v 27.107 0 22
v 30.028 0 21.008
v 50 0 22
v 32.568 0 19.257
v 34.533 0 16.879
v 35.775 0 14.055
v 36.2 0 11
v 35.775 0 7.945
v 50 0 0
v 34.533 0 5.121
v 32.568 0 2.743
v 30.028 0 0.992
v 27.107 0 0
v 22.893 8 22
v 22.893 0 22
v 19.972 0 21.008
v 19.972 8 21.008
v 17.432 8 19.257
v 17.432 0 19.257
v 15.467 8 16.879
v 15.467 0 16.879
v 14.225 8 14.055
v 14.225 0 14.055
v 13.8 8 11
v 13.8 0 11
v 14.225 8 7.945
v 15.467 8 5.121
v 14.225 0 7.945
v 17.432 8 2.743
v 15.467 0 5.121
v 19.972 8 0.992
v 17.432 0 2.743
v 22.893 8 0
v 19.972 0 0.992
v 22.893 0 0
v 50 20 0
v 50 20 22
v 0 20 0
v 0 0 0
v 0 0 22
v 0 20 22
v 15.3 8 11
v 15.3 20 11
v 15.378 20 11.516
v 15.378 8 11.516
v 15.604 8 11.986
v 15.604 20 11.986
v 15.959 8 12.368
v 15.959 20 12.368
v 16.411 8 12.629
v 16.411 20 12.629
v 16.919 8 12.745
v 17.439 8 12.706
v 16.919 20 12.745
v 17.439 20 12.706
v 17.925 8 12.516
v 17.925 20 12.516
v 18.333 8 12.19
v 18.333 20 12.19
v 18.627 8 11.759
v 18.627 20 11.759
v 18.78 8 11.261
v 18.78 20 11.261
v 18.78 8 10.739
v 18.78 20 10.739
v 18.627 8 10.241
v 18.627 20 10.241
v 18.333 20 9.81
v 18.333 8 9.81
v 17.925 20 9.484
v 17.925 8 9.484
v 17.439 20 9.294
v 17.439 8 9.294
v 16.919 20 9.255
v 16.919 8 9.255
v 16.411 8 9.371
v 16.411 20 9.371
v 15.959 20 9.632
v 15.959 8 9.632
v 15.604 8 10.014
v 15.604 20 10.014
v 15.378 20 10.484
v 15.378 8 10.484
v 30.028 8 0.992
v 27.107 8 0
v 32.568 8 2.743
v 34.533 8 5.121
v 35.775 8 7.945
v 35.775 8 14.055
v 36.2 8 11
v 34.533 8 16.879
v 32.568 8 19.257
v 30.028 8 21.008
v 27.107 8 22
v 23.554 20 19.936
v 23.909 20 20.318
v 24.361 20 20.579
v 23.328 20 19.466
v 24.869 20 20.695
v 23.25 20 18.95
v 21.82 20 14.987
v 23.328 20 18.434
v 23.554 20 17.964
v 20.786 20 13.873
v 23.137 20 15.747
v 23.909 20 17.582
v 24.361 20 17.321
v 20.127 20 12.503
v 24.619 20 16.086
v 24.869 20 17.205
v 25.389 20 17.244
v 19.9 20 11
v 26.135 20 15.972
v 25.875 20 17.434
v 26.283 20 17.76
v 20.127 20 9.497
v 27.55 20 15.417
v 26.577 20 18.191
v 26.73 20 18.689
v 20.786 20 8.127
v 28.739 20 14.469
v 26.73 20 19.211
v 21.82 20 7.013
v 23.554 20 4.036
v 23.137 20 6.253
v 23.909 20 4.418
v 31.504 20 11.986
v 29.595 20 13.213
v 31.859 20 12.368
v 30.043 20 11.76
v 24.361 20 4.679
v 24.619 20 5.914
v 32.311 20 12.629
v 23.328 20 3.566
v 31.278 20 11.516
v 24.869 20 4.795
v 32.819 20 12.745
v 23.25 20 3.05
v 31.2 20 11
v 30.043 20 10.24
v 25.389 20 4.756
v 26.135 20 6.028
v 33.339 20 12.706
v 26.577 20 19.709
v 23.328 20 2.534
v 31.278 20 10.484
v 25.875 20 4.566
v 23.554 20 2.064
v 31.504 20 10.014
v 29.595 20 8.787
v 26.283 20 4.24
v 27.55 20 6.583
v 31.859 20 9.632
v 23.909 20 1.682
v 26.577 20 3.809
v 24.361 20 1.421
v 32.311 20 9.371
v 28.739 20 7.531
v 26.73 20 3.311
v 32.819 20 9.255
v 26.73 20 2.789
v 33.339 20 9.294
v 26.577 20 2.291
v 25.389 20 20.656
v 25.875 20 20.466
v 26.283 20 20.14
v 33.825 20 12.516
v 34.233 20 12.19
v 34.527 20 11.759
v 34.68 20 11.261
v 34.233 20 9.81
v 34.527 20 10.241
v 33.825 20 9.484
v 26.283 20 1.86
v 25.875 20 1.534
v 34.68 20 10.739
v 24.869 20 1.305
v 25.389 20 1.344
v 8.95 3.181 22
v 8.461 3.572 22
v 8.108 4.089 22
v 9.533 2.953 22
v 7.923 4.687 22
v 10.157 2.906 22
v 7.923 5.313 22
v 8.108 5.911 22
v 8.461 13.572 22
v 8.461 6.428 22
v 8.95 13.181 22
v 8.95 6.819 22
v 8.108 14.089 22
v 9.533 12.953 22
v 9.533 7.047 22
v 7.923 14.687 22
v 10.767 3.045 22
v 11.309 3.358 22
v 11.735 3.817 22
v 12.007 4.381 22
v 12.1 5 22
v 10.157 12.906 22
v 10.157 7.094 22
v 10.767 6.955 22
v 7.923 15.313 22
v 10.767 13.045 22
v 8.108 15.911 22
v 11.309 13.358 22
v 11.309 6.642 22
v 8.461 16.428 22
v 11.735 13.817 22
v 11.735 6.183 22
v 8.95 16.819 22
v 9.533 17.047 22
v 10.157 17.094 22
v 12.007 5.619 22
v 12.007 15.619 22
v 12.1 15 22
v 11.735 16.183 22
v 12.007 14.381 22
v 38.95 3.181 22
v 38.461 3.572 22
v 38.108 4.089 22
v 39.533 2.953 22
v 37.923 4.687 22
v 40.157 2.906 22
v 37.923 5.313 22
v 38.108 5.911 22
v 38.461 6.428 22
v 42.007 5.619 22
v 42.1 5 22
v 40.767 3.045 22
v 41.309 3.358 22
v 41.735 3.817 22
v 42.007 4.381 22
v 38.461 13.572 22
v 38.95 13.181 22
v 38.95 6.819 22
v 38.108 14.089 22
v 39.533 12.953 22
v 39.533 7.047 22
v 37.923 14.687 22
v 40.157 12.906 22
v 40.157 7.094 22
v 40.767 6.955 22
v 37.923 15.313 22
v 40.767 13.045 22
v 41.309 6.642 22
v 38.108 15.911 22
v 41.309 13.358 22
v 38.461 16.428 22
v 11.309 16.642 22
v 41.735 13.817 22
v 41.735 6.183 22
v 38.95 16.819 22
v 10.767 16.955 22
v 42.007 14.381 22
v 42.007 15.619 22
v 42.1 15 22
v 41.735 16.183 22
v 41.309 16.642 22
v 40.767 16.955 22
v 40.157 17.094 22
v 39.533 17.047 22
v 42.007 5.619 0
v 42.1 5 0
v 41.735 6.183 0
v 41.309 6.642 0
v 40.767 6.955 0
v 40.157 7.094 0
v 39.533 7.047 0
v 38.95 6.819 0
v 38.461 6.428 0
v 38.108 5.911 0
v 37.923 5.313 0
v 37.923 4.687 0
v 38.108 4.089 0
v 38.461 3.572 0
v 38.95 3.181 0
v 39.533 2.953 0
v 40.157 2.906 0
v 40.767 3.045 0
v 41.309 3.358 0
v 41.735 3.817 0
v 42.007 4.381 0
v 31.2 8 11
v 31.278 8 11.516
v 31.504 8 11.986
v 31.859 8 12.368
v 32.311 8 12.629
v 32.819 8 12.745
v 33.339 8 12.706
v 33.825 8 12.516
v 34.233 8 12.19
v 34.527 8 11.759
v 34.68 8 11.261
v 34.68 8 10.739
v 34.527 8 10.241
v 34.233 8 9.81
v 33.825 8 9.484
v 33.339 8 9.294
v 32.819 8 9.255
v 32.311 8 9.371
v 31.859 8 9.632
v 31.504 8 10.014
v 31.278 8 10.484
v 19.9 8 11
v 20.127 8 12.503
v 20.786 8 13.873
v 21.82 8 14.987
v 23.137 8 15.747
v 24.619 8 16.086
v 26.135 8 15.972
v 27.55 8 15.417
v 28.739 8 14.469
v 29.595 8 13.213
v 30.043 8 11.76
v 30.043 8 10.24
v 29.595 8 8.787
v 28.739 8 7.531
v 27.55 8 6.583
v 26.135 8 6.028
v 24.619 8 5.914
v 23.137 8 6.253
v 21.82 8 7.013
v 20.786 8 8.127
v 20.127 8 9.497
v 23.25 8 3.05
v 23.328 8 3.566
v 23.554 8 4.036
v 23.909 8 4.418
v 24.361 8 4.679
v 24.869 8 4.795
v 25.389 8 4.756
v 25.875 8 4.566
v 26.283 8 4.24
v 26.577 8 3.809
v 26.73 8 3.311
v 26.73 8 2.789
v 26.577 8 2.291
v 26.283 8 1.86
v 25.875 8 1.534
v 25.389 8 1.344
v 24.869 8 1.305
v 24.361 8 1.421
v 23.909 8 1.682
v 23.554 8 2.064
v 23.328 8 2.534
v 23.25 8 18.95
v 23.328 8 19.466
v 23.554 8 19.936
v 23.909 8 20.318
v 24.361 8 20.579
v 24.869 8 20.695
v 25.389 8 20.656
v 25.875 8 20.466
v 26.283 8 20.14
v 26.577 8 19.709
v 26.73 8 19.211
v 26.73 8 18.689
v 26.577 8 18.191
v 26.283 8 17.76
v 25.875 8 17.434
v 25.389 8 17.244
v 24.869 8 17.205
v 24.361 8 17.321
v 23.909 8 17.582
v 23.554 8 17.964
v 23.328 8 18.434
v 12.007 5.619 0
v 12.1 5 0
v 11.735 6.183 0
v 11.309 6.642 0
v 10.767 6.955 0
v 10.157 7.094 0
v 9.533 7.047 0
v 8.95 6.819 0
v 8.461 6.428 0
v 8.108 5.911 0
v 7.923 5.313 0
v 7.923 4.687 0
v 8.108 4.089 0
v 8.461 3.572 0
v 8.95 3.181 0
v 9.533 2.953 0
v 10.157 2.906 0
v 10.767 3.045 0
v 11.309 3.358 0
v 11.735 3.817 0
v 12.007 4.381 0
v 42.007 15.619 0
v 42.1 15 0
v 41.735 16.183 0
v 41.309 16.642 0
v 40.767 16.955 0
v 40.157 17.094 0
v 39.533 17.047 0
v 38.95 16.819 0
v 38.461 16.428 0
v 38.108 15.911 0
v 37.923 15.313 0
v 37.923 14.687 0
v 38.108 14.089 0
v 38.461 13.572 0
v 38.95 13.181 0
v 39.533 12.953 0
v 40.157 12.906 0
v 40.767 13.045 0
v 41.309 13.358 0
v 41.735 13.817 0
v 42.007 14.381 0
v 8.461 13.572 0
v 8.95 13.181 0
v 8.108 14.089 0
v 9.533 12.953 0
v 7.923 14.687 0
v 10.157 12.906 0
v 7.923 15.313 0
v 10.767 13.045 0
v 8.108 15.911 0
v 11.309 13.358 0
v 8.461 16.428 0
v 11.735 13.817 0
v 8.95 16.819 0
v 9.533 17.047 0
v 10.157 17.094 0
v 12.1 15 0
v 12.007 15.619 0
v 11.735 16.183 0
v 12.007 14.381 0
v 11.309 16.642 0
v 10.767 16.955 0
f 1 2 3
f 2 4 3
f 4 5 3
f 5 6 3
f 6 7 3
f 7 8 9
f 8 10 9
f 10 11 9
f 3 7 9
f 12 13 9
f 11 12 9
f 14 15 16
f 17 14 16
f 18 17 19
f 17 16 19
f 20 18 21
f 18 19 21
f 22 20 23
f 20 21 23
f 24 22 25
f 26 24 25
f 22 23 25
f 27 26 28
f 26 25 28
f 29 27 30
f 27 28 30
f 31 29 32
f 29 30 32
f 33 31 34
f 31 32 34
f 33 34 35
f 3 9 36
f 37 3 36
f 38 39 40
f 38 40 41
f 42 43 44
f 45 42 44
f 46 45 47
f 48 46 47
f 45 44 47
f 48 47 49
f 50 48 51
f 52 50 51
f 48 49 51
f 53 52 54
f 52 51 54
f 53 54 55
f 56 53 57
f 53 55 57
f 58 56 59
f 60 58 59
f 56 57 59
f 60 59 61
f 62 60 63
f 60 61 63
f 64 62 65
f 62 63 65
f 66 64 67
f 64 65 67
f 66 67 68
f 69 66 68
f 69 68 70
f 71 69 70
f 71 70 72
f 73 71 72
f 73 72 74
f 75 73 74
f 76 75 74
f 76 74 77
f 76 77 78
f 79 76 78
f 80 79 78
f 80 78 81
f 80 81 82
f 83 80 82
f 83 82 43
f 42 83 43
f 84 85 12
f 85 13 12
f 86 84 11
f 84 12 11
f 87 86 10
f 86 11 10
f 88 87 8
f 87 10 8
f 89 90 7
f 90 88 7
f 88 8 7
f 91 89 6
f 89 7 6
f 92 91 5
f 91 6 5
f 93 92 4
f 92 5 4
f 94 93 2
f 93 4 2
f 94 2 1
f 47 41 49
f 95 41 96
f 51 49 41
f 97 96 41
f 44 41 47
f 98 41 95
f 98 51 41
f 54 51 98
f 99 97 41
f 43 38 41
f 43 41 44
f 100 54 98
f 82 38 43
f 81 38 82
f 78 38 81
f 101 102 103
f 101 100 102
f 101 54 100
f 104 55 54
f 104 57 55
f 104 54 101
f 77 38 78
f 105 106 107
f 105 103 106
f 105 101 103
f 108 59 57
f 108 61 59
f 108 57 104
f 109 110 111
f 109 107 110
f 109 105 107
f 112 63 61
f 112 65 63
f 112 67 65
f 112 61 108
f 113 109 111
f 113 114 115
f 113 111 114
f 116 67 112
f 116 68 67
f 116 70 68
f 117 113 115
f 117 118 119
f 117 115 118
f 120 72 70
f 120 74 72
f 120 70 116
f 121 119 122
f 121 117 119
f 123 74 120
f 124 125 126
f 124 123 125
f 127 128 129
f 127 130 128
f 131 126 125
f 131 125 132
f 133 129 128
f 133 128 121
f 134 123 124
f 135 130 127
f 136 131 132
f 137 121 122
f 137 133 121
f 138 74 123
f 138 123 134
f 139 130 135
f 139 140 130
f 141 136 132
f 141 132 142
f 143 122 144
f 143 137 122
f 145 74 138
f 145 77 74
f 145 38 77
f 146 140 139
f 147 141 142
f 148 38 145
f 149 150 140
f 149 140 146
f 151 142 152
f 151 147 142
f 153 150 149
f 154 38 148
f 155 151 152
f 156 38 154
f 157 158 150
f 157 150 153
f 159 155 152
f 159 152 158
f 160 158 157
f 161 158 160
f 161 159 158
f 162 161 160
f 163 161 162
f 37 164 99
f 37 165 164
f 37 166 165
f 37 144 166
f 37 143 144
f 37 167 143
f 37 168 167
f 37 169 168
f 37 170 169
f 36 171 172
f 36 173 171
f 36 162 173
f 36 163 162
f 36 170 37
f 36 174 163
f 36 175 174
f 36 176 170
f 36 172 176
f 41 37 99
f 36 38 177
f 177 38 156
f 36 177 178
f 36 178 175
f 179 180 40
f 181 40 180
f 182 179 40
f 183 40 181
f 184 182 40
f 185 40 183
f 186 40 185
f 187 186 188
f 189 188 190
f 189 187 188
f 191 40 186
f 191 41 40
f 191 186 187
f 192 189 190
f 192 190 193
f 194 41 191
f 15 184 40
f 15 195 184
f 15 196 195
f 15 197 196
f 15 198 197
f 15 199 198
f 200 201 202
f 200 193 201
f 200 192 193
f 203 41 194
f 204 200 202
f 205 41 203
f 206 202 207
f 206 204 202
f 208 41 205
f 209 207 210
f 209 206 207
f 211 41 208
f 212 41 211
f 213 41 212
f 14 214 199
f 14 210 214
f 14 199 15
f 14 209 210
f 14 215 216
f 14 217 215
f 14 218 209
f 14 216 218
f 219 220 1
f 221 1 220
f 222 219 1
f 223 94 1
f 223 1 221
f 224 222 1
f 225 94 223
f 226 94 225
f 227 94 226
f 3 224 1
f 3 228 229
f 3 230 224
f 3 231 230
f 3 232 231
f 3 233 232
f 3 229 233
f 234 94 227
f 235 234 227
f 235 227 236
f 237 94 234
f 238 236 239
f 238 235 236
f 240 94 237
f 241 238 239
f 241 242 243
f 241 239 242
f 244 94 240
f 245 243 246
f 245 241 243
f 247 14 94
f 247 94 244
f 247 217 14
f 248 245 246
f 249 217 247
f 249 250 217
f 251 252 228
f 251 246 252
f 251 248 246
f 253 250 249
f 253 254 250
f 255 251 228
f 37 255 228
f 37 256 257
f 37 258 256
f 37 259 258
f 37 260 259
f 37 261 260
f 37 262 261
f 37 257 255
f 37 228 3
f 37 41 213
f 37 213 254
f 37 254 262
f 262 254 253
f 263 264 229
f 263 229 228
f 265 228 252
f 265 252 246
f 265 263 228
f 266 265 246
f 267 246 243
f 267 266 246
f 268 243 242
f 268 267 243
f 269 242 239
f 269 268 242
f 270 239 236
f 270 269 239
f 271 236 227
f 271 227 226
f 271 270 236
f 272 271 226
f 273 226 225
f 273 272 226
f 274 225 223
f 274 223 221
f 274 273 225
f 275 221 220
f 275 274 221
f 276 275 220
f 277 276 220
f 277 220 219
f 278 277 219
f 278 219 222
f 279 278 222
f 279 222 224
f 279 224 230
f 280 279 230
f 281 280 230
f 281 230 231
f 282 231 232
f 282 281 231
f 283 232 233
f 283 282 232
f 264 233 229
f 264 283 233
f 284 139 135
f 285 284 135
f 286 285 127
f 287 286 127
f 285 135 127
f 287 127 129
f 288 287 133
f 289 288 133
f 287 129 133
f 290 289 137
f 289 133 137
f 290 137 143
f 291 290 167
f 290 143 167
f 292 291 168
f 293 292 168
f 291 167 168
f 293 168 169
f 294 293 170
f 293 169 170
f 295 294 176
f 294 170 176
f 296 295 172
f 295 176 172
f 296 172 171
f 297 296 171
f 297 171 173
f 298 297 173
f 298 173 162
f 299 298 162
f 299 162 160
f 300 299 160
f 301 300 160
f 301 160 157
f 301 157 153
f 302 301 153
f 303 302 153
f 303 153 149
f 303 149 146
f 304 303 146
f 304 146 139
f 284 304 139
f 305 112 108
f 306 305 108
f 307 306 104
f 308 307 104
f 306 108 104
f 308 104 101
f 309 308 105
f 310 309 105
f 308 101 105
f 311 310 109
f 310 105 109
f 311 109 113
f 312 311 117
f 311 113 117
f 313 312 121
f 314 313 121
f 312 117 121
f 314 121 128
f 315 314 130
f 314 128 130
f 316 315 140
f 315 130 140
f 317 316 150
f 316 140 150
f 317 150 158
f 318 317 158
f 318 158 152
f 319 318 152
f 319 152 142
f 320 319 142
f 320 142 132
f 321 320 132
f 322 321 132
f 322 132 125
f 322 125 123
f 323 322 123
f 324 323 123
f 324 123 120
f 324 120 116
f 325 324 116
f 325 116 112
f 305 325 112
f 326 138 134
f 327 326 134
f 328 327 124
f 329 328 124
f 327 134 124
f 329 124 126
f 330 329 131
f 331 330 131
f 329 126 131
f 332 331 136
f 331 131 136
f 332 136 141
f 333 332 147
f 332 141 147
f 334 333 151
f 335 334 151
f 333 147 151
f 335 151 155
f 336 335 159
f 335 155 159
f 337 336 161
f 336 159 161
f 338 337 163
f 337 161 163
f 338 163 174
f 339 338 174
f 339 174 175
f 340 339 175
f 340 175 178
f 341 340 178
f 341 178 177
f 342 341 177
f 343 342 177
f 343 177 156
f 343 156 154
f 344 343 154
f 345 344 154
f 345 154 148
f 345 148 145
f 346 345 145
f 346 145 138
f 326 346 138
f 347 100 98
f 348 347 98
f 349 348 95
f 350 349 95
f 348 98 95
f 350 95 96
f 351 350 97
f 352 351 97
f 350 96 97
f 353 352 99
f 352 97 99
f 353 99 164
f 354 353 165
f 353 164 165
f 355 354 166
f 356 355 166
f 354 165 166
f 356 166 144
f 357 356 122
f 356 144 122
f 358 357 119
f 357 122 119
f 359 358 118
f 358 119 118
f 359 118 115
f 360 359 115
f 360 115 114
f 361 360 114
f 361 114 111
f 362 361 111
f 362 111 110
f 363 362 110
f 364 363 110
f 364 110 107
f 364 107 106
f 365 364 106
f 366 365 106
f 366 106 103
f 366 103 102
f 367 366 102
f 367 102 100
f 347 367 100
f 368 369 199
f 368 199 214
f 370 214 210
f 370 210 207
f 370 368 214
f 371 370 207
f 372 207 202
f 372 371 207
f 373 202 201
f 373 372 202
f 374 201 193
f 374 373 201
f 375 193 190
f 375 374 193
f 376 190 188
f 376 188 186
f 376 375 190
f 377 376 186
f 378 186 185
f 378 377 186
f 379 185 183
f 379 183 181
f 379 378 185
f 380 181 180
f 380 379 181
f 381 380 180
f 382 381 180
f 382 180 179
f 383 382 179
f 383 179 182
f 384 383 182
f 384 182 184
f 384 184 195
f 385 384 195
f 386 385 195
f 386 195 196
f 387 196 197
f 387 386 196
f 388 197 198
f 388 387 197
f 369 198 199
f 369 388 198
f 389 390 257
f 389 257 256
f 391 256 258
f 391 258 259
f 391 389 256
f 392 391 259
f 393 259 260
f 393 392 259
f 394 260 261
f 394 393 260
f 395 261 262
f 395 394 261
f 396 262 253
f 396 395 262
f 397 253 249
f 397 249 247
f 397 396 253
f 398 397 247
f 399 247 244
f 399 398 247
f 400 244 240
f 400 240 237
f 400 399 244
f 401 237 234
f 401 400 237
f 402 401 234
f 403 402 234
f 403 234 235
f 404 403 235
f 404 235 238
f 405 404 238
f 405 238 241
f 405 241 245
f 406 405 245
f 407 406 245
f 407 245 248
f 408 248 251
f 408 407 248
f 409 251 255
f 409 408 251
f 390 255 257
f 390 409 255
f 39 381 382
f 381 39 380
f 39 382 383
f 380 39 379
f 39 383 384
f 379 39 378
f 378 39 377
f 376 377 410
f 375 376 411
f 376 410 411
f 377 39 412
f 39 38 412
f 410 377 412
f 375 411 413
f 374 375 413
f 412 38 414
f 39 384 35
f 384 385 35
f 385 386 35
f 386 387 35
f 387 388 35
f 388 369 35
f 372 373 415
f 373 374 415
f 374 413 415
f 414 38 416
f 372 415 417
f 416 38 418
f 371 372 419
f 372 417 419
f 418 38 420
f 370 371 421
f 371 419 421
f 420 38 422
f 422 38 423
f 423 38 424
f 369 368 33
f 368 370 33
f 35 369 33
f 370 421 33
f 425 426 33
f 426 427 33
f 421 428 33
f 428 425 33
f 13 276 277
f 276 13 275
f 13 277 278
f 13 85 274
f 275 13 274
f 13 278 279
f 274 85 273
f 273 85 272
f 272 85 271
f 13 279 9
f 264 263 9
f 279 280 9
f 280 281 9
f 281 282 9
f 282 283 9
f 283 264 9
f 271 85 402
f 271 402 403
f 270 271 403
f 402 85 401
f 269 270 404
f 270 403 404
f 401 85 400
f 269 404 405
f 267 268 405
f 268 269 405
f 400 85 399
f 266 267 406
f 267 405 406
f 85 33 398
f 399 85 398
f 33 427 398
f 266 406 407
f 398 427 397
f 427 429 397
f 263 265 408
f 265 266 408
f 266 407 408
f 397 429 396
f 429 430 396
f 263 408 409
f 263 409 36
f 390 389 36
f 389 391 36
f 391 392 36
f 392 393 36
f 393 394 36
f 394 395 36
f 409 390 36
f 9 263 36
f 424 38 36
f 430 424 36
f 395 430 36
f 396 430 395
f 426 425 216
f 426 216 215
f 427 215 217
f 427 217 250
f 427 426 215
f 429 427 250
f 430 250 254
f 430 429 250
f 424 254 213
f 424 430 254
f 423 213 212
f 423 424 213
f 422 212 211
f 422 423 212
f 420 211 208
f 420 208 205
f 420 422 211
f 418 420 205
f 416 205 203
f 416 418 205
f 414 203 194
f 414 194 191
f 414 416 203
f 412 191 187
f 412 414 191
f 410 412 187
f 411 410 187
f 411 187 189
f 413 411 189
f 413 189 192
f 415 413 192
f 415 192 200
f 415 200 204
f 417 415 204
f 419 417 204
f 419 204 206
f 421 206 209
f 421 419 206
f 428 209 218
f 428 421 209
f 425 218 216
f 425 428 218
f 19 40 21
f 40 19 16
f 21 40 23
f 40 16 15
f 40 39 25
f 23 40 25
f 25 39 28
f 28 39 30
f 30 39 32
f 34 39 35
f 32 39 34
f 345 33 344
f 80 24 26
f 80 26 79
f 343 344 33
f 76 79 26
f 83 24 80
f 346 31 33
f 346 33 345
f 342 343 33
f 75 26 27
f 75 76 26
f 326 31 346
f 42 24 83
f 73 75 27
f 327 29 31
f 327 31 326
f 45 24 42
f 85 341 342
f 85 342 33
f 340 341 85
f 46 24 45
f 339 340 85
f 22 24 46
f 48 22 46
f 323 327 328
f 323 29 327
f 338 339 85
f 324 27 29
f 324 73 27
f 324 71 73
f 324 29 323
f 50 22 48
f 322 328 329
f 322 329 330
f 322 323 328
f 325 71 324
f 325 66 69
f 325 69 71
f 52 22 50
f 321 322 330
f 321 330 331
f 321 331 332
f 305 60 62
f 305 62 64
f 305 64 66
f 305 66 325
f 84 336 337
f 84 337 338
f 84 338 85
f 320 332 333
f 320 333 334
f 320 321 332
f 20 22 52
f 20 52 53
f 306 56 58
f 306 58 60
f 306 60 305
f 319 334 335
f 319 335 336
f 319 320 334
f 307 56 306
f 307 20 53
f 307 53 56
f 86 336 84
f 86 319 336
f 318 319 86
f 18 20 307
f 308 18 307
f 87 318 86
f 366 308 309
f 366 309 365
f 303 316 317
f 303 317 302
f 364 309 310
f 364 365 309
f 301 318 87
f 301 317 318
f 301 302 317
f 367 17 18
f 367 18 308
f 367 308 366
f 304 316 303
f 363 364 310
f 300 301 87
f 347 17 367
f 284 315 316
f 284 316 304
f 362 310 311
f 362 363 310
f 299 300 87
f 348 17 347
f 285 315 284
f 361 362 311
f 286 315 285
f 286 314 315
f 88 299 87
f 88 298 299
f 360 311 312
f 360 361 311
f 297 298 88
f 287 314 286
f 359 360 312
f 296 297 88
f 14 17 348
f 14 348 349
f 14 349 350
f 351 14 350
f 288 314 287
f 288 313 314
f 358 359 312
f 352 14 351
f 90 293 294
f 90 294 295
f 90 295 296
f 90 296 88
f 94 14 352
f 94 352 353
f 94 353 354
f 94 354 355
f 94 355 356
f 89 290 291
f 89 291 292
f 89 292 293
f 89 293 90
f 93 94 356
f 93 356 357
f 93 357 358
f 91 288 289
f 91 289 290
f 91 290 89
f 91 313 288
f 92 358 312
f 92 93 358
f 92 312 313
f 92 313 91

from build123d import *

# Parameters (mm, degrees)
SKETCH_W        = 50
SKETCH_H        = 20
SKETCH_R        = 2.1
PAD_DEPTH       = 22
SKETCH001_R     = 11.2
POCKET_DEPTH    = 8
SKETCH002_R     = 5.1
SKETCH002_R_2   = 1.75
POCKET001_DEPTH = 20


with BuildPart() as part:
    # Sketch → Pad (new body)
    with BuildSketch(Plane.XY):
        with Locations((25, 10)):
            Rectangle(SKETCH_W, SKETCH_H)
        with Locations((10, 15)):
            Circle(SKETCH_R, mode=Mode.SUBTRACT)
        with Locations((10, 5)):
            Circle(SKETCH_R, mode=Mode.SUBTRACT)
        with Locations((40, 15)):
            Circle(SKETCH_R, mode=Mode.SUBTRACT)
        with Locations((40, 5)):
            Circle(SKETCH_R, mode=Mode.SUBTRACT)
    extrude(amount=PAD_DEPTH)

    # Sketch001 (on Face3 of Pad) → Pocket (cut)
    with BuildSketch(Plane.XZ):
        with Locations((25, 11)):
            Circle(SKETCH001_R)
    extrude(amount=-POCKET_DEPTH, mode=Mode.SUBTRACT)

    # Sketch002 (on Face1 of Pocket) → Pocket001 (cut)
    with BuildSketch(Plane(origin=(0, 20, 0), x_dir=(-1, 0, 0), z_dir=(0, 1, 0))):
        with Locations((-25, 11)):
            Circle(SKETCH002_R)
        with Locations((-25, 18.95)):
            Circle(SKETCH002_R_2)
        with Locations((-25, 3.05)):
            Circle(SKETCH002_R_2)
        with Locations((-32.95, 11)):
            Circle(SKETCH002_R_2)
        with Locations((-17.05, 11)):
            Circle(SKETCH002_R_2)
    extrude(amount=-POCKET001_DEPTH, mode=Mode.SUBTRACT)


solid = part.part
